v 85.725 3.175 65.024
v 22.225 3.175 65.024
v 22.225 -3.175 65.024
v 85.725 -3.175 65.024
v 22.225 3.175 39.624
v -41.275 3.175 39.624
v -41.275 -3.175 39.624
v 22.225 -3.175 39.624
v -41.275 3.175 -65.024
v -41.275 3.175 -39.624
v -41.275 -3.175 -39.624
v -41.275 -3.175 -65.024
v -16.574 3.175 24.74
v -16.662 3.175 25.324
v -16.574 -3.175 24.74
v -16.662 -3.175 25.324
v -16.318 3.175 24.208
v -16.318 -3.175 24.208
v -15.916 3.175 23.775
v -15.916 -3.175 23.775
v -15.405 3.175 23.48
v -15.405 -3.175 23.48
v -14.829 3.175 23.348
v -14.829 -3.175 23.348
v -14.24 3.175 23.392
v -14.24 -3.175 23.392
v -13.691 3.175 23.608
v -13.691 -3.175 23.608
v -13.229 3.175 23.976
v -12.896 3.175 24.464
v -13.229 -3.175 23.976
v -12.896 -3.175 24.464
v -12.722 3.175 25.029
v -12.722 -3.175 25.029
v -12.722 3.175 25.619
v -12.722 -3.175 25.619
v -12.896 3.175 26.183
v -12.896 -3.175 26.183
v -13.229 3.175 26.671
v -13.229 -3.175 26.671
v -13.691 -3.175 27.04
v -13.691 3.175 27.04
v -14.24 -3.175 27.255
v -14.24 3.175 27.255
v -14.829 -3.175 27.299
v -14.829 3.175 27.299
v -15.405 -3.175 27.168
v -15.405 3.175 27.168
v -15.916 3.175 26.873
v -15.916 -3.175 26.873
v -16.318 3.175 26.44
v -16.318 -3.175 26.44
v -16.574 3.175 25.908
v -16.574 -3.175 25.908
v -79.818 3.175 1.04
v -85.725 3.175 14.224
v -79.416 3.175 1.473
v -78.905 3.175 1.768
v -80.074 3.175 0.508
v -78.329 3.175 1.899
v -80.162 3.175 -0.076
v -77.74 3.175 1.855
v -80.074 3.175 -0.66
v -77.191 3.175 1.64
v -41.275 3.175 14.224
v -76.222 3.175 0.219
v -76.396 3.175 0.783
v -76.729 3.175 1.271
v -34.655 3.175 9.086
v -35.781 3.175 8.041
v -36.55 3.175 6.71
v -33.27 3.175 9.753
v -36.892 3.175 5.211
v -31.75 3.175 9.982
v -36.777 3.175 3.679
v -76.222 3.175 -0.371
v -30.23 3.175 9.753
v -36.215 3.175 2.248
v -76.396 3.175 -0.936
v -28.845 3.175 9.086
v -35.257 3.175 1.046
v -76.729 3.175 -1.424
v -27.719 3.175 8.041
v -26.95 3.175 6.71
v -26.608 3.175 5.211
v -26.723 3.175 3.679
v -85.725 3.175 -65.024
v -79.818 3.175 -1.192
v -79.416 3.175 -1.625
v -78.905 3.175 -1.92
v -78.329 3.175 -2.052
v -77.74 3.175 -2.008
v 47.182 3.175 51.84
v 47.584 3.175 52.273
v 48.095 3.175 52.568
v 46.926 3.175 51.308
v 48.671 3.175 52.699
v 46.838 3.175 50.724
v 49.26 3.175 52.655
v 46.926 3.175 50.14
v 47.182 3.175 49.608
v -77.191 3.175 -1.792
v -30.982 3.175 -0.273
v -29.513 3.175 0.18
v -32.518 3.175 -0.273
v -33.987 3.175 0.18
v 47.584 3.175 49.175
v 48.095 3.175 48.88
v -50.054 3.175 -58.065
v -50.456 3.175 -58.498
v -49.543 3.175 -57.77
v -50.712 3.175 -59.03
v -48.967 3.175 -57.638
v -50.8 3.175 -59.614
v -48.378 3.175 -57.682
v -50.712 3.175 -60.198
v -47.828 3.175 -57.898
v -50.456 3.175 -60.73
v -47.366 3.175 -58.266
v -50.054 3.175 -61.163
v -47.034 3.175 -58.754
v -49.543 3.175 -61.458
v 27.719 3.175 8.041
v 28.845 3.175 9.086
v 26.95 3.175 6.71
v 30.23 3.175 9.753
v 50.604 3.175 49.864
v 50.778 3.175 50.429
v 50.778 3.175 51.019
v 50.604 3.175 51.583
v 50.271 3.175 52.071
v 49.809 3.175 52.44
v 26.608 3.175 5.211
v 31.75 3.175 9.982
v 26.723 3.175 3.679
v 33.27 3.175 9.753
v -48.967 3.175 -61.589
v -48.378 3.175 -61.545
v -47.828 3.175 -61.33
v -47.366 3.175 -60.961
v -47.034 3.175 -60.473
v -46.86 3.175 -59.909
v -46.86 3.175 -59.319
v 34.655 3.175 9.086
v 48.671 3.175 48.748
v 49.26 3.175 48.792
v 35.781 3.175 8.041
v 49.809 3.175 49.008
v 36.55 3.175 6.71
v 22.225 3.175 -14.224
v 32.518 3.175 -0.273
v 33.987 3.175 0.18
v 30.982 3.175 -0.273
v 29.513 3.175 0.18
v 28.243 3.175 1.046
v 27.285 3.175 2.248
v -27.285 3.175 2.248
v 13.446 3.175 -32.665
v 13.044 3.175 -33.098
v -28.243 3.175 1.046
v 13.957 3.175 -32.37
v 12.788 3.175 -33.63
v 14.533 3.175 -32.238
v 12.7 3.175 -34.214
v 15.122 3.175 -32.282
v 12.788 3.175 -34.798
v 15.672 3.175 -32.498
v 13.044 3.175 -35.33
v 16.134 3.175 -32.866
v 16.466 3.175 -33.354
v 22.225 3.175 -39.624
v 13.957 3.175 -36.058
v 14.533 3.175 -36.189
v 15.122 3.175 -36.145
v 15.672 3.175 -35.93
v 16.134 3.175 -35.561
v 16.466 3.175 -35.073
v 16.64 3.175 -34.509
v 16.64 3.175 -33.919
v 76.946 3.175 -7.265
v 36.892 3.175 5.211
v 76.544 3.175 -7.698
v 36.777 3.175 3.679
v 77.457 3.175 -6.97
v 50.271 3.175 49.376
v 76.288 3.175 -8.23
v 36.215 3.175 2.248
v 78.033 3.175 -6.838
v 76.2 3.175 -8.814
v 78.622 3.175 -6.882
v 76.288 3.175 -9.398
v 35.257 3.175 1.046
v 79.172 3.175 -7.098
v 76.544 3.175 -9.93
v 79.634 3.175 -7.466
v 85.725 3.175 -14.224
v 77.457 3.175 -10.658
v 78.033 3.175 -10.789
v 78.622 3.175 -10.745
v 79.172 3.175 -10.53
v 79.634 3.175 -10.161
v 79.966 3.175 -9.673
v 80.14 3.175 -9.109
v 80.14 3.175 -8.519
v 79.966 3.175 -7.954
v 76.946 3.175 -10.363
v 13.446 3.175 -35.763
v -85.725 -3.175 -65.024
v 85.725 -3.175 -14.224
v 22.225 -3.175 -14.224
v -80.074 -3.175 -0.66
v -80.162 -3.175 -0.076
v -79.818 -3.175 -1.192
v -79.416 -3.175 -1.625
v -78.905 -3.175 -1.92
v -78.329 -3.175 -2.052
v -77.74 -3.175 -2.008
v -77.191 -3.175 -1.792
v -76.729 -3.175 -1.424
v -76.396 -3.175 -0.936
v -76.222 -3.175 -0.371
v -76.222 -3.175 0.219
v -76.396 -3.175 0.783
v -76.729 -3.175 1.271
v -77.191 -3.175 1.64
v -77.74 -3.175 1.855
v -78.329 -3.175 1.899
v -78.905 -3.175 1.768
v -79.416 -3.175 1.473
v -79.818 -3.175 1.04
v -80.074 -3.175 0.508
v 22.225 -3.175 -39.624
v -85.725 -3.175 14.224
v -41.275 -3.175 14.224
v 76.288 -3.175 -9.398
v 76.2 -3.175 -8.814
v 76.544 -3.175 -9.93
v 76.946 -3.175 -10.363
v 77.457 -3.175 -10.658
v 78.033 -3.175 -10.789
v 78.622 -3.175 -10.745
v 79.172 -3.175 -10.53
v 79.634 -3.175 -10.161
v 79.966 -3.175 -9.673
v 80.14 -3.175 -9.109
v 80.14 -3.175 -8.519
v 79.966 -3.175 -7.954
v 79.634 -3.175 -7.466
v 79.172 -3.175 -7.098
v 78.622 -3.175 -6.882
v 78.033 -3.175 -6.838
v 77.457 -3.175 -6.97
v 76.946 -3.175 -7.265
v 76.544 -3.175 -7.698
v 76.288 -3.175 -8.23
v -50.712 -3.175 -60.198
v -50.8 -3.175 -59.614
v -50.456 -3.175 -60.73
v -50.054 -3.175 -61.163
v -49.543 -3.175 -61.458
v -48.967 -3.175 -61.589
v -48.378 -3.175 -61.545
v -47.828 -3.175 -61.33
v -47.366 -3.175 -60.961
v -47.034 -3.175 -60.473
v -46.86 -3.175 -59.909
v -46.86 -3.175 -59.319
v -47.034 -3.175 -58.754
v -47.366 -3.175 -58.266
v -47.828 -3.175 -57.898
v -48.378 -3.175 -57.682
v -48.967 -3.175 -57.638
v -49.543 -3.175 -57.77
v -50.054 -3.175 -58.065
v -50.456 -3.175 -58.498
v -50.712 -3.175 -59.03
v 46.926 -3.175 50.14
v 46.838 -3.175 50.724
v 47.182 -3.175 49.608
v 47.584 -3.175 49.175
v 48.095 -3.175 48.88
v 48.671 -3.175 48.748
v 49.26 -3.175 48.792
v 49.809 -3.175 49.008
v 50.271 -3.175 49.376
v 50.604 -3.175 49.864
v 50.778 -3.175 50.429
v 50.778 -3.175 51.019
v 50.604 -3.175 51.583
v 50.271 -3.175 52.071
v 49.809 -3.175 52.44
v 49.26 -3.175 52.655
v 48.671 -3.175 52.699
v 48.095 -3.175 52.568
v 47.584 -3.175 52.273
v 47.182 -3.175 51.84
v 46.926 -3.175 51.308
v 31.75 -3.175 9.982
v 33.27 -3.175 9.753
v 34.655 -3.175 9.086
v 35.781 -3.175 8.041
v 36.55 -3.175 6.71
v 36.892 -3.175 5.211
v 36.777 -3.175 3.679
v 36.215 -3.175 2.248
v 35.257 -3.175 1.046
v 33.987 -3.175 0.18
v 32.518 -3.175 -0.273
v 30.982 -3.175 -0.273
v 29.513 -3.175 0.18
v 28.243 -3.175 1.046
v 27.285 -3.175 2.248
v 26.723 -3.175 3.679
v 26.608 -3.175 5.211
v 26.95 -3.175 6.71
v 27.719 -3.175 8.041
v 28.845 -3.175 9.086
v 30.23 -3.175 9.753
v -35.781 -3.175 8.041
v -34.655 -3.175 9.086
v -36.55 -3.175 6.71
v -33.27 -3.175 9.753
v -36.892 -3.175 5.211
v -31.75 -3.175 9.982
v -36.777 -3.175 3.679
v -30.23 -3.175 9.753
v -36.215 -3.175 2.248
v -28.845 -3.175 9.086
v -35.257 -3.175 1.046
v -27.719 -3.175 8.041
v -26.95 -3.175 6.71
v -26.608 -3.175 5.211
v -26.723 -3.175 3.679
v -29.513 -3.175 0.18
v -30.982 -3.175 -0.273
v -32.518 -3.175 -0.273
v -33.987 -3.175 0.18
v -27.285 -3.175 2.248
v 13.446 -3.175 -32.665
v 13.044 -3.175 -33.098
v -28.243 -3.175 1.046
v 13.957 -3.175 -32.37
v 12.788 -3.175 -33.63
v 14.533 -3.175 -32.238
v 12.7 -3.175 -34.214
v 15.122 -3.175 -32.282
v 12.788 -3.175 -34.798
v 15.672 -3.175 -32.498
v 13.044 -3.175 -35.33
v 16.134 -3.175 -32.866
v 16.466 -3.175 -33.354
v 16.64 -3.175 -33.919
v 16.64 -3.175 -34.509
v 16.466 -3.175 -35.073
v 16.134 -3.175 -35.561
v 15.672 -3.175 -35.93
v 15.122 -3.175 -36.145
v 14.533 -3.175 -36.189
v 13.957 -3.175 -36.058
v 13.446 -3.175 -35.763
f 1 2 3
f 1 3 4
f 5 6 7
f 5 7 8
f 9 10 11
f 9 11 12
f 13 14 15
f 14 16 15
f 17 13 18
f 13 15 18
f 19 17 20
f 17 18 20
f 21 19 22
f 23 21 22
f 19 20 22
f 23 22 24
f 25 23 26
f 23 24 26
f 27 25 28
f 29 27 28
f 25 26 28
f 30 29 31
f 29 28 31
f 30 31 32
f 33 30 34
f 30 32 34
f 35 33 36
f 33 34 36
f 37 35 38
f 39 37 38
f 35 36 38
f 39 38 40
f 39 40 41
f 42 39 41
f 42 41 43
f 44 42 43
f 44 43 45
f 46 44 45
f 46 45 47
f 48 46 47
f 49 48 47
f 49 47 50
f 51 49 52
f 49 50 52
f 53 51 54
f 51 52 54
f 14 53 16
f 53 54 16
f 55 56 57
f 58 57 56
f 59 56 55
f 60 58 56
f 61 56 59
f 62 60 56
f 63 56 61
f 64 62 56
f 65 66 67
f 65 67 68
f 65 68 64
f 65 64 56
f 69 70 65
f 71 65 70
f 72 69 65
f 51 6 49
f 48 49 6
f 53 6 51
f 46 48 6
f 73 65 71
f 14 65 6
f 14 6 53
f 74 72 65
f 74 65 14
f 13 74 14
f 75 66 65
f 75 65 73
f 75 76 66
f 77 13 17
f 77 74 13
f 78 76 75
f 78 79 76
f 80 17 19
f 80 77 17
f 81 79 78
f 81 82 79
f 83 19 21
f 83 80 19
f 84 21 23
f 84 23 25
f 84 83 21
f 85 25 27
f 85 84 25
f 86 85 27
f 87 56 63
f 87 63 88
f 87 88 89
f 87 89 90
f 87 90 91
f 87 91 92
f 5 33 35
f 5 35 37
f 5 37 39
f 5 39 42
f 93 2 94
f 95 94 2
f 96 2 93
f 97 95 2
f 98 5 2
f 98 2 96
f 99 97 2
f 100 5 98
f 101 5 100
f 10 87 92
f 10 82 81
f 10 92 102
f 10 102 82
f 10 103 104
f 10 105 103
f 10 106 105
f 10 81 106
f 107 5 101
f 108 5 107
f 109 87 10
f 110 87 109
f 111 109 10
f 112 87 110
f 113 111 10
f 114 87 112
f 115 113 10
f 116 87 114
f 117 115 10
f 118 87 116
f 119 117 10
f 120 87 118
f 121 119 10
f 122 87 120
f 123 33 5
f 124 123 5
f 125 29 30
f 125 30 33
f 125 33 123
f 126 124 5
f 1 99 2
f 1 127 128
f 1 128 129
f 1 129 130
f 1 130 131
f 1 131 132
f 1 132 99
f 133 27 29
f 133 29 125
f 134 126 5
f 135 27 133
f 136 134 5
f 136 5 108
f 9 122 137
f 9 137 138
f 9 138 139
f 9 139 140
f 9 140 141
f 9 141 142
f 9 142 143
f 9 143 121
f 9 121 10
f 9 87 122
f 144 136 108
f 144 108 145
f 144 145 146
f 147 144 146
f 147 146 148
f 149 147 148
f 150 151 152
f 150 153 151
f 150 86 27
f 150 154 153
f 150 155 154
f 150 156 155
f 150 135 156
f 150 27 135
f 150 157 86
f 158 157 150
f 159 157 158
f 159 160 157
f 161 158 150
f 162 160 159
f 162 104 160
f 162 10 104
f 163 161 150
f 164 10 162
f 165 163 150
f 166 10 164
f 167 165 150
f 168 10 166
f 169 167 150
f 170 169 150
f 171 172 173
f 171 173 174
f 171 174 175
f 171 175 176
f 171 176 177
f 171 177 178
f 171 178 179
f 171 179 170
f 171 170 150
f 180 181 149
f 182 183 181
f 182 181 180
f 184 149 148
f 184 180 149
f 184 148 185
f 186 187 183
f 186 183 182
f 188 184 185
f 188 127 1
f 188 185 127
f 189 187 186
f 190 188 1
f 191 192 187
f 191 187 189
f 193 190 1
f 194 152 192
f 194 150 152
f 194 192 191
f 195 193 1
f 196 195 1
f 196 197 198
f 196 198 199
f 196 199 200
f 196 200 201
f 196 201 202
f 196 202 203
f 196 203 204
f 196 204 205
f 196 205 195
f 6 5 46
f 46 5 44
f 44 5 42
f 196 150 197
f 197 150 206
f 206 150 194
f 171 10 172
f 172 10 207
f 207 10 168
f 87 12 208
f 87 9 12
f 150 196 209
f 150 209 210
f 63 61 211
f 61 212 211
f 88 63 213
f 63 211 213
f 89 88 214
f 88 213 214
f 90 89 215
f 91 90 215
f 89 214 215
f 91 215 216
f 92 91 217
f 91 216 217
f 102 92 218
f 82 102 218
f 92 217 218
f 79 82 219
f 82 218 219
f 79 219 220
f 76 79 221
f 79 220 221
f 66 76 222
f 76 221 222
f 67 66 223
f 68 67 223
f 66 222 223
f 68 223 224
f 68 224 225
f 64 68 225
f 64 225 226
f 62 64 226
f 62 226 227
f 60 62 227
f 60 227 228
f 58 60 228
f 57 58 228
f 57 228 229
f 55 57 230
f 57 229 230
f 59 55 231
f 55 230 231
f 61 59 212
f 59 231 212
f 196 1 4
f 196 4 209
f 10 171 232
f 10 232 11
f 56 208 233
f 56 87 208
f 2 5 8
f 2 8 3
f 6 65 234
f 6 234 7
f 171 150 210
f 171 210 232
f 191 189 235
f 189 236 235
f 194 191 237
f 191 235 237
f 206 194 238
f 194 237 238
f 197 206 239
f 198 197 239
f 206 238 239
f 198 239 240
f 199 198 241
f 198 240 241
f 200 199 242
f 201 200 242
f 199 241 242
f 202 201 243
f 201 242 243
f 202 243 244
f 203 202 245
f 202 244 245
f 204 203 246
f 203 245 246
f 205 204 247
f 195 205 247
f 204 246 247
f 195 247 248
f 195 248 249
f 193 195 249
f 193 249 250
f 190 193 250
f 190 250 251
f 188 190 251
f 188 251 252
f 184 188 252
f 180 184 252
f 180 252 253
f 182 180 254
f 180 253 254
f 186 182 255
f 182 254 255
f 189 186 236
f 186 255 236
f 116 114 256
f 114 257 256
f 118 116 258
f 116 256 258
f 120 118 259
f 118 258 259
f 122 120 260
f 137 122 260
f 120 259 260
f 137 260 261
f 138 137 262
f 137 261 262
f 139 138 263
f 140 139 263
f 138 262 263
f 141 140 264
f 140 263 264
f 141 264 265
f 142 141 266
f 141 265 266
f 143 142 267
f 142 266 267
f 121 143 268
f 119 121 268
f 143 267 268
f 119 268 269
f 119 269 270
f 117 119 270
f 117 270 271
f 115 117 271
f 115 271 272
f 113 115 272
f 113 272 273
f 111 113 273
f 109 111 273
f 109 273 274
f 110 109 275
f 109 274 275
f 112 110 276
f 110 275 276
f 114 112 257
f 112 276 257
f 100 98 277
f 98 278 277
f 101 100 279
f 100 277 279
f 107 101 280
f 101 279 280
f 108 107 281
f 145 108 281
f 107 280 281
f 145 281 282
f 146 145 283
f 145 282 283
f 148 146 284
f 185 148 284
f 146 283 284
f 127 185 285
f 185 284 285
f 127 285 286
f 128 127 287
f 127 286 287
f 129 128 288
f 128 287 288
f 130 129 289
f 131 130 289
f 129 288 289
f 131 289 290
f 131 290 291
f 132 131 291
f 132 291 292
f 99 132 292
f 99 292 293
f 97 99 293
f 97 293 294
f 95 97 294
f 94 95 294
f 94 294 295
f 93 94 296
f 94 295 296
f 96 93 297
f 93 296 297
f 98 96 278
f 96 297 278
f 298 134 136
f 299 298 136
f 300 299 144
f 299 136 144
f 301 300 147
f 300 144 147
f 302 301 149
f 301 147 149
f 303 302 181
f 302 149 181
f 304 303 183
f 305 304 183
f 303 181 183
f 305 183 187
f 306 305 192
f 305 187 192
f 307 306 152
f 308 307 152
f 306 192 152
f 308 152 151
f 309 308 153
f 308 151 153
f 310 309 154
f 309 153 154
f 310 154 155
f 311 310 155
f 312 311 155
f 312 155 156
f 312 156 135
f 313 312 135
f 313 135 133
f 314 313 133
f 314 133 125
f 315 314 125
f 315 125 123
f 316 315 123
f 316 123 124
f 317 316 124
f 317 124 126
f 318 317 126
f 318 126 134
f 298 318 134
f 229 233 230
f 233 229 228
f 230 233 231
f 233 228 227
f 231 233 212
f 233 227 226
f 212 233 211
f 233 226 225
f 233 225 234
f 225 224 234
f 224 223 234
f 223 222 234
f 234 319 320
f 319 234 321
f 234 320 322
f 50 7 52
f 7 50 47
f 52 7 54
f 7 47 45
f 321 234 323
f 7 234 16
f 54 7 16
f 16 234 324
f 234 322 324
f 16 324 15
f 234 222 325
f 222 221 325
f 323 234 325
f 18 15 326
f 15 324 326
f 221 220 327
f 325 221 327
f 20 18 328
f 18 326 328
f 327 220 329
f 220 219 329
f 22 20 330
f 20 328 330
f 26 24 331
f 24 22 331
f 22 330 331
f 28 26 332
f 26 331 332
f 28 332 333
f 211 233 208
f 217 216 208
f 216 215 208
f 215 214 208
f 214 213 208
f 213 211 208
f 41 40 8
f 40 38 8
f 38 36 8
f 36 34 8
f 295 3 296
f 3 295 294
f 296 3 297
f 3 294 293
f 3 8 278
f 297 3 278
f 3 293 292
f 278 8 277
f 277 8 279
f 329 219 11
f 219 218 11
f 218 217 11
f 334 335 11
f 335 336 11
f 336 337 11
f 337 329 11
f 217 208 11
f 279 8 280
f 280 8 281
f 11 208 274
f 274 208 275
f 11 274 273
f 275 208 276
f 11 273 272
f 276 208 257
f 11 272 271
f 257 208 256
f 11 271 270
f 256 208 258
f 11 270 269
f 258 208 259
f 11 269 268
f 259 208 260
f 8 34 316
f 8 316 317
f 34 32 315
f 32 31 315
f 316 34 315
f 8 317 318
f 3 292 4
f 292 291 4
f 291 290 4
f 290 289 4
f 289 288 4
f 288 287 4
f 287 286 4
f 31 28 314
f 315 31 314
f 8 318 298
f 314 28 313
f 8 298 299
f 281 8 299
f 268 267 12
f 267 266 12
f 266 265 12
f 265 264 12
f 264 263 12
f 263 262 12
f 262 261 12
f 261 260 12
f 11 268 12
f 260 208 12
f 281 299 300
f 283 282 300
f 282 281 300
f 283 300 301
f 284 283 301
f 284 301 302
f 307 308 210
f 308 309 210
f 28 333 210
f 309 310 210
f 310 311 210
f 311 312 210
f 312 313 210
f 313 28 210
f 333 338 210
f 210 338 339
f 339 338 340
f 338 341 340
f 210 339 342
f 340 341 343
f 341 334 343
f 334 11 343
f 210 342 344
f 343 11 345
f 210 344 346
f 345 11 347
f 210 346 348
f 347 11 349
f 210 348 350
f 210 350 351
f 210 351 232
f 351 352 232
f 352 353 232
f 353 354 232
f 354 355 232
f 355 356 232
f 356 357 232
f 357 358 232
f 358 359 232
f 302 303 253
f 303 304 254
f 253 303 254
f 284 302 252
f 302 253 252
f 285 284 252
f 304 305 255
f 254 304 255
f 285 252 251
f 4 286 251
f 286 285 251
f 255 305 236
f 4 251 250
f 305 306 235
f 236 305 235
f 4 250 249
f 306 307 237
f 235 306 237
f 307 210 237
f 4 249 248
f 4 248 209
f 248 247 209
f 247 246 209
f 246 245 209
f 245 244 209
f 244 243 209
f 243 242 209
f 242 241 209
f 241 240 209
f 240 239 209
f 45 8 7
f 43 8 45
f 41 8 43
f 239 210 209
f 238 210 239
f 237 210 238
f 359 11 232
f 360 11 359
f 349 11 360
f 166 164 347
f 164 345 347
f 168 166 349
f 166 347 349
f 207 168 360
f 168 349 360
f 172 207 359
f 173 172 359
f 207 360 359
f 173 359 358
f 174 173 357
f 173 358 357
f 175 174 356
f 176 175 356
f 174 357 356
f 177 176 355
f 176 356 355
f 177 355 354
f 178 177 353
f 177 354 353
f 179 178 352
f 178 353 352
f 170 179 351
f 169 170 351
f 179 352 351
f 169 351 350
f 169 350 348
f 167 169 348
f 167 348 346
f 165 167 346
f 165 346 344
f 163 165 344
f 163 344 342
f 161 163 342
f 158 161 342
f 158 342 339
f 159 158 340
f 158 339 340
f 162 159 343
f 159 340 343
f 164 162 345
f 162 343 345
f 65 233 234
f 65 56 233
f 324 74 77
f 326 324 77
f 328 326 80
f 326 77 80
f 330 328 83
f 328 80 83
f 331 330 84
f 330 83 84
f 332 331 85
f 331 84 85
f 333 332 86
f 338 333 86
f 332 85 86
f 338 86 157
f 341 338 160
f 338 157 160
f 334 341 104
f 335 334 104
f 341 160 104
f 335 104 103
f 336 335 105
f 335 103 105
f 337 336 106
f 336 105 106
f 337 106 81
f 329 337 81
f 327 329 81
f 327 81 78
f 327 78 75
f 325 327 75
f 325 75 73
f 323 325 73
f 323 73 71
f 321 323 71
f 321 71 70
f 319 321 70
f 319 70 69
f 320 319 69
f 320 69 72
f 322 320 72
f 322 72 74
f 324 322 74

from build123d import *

# Parameters (mm, degrees)
BOSS_EXTRUDE1_DEPTH        = 3.175
CUT_EXTRUDE2_START         = 3.175
SKETCH2_R                  = 5.1562
CUT_EXTRUDE2_DEPTH         = 111.817820597
F_10_24_TAPPED_HOLE1_D     = 3.9624
F_10_24_TAPPED_HOLE1_DEPTH = 6.35
F_10_24_TAPPED_HOLE1_TIP   = 1.190425058


with BuildPart() as part:
    # Sketch1 → Boss-Extrude1 (new, symmetric)
    with BuildSketch(Plane(origin=(0, 0, 0), x_dir=(1, 0, 0), z_dir=(0, 1, 0))):
        Polygon((-85.725, -14.224), (-41.275, -14.224), (-41.275, -39.624), (22.225, -39.624), (22.225, -65.024), (85.725, -65.024), (85.725, 14.224), (22.225, 14.224), (22.225, 39.624), (-41.275, 39.624), (-41.275, 65.024), (-85.725, 65.024), align=None)
    extrude(amount=BOSS_EXTRUDE1_DEPTH, both=True)

    # Sketch2 → Cut-Extrude2 (cut, through all)
    with BuildSketch(Plane(origin=(0, 0, 0), x_dir=(1, 0, 0), z_dir=(0, 1, 0)).offset(CUT_EXTRUDE2_START)):
        with Locations(Location((-31.75, -4.826, 0), (0, 0, 270))):
            Circle(SKETCH2_R)
        with Locations(Location((31.75, -4.826, 0), (0, 0, 270))):
            Circle(SKETCH2_R)
    extrude(amount=-CUT_EXTRUDE2_DEPTH, mode=Mode.SUBTRACT)

    # #10-24 Tapped Hole1
    with Locations(Plane(origin=(0, 3.175, 0), x_dir=(1, 0, 0), z_dir=(0, 1, 0))):
        with Locations((-78.1812, 0.0762), (-48.8188, 59.6138), (-14.6812, -25.3238), (14.6812, 34.2138), (48.8188, -50.7238), (78.1812, 8.8138)):
            Hole(F_10_24_TAPPED_HOLE1_D / 2, depth=F_10_24_TAPPED_HOLE1_DEPTH)
            with Locations((0, 0, -(F_10_24_TAPPED_HOLE1_DEPTH + F_10_24_TAPPED_HOLE1_TIP / 2))):  # 118° drill point
                Cone(0, F_10_24_TAPPED_HOLE1_D / 2, F_10_24_TAPPED_HOLE1_TIP, mode=Mode.SUBTRACT)


solid = part.part
